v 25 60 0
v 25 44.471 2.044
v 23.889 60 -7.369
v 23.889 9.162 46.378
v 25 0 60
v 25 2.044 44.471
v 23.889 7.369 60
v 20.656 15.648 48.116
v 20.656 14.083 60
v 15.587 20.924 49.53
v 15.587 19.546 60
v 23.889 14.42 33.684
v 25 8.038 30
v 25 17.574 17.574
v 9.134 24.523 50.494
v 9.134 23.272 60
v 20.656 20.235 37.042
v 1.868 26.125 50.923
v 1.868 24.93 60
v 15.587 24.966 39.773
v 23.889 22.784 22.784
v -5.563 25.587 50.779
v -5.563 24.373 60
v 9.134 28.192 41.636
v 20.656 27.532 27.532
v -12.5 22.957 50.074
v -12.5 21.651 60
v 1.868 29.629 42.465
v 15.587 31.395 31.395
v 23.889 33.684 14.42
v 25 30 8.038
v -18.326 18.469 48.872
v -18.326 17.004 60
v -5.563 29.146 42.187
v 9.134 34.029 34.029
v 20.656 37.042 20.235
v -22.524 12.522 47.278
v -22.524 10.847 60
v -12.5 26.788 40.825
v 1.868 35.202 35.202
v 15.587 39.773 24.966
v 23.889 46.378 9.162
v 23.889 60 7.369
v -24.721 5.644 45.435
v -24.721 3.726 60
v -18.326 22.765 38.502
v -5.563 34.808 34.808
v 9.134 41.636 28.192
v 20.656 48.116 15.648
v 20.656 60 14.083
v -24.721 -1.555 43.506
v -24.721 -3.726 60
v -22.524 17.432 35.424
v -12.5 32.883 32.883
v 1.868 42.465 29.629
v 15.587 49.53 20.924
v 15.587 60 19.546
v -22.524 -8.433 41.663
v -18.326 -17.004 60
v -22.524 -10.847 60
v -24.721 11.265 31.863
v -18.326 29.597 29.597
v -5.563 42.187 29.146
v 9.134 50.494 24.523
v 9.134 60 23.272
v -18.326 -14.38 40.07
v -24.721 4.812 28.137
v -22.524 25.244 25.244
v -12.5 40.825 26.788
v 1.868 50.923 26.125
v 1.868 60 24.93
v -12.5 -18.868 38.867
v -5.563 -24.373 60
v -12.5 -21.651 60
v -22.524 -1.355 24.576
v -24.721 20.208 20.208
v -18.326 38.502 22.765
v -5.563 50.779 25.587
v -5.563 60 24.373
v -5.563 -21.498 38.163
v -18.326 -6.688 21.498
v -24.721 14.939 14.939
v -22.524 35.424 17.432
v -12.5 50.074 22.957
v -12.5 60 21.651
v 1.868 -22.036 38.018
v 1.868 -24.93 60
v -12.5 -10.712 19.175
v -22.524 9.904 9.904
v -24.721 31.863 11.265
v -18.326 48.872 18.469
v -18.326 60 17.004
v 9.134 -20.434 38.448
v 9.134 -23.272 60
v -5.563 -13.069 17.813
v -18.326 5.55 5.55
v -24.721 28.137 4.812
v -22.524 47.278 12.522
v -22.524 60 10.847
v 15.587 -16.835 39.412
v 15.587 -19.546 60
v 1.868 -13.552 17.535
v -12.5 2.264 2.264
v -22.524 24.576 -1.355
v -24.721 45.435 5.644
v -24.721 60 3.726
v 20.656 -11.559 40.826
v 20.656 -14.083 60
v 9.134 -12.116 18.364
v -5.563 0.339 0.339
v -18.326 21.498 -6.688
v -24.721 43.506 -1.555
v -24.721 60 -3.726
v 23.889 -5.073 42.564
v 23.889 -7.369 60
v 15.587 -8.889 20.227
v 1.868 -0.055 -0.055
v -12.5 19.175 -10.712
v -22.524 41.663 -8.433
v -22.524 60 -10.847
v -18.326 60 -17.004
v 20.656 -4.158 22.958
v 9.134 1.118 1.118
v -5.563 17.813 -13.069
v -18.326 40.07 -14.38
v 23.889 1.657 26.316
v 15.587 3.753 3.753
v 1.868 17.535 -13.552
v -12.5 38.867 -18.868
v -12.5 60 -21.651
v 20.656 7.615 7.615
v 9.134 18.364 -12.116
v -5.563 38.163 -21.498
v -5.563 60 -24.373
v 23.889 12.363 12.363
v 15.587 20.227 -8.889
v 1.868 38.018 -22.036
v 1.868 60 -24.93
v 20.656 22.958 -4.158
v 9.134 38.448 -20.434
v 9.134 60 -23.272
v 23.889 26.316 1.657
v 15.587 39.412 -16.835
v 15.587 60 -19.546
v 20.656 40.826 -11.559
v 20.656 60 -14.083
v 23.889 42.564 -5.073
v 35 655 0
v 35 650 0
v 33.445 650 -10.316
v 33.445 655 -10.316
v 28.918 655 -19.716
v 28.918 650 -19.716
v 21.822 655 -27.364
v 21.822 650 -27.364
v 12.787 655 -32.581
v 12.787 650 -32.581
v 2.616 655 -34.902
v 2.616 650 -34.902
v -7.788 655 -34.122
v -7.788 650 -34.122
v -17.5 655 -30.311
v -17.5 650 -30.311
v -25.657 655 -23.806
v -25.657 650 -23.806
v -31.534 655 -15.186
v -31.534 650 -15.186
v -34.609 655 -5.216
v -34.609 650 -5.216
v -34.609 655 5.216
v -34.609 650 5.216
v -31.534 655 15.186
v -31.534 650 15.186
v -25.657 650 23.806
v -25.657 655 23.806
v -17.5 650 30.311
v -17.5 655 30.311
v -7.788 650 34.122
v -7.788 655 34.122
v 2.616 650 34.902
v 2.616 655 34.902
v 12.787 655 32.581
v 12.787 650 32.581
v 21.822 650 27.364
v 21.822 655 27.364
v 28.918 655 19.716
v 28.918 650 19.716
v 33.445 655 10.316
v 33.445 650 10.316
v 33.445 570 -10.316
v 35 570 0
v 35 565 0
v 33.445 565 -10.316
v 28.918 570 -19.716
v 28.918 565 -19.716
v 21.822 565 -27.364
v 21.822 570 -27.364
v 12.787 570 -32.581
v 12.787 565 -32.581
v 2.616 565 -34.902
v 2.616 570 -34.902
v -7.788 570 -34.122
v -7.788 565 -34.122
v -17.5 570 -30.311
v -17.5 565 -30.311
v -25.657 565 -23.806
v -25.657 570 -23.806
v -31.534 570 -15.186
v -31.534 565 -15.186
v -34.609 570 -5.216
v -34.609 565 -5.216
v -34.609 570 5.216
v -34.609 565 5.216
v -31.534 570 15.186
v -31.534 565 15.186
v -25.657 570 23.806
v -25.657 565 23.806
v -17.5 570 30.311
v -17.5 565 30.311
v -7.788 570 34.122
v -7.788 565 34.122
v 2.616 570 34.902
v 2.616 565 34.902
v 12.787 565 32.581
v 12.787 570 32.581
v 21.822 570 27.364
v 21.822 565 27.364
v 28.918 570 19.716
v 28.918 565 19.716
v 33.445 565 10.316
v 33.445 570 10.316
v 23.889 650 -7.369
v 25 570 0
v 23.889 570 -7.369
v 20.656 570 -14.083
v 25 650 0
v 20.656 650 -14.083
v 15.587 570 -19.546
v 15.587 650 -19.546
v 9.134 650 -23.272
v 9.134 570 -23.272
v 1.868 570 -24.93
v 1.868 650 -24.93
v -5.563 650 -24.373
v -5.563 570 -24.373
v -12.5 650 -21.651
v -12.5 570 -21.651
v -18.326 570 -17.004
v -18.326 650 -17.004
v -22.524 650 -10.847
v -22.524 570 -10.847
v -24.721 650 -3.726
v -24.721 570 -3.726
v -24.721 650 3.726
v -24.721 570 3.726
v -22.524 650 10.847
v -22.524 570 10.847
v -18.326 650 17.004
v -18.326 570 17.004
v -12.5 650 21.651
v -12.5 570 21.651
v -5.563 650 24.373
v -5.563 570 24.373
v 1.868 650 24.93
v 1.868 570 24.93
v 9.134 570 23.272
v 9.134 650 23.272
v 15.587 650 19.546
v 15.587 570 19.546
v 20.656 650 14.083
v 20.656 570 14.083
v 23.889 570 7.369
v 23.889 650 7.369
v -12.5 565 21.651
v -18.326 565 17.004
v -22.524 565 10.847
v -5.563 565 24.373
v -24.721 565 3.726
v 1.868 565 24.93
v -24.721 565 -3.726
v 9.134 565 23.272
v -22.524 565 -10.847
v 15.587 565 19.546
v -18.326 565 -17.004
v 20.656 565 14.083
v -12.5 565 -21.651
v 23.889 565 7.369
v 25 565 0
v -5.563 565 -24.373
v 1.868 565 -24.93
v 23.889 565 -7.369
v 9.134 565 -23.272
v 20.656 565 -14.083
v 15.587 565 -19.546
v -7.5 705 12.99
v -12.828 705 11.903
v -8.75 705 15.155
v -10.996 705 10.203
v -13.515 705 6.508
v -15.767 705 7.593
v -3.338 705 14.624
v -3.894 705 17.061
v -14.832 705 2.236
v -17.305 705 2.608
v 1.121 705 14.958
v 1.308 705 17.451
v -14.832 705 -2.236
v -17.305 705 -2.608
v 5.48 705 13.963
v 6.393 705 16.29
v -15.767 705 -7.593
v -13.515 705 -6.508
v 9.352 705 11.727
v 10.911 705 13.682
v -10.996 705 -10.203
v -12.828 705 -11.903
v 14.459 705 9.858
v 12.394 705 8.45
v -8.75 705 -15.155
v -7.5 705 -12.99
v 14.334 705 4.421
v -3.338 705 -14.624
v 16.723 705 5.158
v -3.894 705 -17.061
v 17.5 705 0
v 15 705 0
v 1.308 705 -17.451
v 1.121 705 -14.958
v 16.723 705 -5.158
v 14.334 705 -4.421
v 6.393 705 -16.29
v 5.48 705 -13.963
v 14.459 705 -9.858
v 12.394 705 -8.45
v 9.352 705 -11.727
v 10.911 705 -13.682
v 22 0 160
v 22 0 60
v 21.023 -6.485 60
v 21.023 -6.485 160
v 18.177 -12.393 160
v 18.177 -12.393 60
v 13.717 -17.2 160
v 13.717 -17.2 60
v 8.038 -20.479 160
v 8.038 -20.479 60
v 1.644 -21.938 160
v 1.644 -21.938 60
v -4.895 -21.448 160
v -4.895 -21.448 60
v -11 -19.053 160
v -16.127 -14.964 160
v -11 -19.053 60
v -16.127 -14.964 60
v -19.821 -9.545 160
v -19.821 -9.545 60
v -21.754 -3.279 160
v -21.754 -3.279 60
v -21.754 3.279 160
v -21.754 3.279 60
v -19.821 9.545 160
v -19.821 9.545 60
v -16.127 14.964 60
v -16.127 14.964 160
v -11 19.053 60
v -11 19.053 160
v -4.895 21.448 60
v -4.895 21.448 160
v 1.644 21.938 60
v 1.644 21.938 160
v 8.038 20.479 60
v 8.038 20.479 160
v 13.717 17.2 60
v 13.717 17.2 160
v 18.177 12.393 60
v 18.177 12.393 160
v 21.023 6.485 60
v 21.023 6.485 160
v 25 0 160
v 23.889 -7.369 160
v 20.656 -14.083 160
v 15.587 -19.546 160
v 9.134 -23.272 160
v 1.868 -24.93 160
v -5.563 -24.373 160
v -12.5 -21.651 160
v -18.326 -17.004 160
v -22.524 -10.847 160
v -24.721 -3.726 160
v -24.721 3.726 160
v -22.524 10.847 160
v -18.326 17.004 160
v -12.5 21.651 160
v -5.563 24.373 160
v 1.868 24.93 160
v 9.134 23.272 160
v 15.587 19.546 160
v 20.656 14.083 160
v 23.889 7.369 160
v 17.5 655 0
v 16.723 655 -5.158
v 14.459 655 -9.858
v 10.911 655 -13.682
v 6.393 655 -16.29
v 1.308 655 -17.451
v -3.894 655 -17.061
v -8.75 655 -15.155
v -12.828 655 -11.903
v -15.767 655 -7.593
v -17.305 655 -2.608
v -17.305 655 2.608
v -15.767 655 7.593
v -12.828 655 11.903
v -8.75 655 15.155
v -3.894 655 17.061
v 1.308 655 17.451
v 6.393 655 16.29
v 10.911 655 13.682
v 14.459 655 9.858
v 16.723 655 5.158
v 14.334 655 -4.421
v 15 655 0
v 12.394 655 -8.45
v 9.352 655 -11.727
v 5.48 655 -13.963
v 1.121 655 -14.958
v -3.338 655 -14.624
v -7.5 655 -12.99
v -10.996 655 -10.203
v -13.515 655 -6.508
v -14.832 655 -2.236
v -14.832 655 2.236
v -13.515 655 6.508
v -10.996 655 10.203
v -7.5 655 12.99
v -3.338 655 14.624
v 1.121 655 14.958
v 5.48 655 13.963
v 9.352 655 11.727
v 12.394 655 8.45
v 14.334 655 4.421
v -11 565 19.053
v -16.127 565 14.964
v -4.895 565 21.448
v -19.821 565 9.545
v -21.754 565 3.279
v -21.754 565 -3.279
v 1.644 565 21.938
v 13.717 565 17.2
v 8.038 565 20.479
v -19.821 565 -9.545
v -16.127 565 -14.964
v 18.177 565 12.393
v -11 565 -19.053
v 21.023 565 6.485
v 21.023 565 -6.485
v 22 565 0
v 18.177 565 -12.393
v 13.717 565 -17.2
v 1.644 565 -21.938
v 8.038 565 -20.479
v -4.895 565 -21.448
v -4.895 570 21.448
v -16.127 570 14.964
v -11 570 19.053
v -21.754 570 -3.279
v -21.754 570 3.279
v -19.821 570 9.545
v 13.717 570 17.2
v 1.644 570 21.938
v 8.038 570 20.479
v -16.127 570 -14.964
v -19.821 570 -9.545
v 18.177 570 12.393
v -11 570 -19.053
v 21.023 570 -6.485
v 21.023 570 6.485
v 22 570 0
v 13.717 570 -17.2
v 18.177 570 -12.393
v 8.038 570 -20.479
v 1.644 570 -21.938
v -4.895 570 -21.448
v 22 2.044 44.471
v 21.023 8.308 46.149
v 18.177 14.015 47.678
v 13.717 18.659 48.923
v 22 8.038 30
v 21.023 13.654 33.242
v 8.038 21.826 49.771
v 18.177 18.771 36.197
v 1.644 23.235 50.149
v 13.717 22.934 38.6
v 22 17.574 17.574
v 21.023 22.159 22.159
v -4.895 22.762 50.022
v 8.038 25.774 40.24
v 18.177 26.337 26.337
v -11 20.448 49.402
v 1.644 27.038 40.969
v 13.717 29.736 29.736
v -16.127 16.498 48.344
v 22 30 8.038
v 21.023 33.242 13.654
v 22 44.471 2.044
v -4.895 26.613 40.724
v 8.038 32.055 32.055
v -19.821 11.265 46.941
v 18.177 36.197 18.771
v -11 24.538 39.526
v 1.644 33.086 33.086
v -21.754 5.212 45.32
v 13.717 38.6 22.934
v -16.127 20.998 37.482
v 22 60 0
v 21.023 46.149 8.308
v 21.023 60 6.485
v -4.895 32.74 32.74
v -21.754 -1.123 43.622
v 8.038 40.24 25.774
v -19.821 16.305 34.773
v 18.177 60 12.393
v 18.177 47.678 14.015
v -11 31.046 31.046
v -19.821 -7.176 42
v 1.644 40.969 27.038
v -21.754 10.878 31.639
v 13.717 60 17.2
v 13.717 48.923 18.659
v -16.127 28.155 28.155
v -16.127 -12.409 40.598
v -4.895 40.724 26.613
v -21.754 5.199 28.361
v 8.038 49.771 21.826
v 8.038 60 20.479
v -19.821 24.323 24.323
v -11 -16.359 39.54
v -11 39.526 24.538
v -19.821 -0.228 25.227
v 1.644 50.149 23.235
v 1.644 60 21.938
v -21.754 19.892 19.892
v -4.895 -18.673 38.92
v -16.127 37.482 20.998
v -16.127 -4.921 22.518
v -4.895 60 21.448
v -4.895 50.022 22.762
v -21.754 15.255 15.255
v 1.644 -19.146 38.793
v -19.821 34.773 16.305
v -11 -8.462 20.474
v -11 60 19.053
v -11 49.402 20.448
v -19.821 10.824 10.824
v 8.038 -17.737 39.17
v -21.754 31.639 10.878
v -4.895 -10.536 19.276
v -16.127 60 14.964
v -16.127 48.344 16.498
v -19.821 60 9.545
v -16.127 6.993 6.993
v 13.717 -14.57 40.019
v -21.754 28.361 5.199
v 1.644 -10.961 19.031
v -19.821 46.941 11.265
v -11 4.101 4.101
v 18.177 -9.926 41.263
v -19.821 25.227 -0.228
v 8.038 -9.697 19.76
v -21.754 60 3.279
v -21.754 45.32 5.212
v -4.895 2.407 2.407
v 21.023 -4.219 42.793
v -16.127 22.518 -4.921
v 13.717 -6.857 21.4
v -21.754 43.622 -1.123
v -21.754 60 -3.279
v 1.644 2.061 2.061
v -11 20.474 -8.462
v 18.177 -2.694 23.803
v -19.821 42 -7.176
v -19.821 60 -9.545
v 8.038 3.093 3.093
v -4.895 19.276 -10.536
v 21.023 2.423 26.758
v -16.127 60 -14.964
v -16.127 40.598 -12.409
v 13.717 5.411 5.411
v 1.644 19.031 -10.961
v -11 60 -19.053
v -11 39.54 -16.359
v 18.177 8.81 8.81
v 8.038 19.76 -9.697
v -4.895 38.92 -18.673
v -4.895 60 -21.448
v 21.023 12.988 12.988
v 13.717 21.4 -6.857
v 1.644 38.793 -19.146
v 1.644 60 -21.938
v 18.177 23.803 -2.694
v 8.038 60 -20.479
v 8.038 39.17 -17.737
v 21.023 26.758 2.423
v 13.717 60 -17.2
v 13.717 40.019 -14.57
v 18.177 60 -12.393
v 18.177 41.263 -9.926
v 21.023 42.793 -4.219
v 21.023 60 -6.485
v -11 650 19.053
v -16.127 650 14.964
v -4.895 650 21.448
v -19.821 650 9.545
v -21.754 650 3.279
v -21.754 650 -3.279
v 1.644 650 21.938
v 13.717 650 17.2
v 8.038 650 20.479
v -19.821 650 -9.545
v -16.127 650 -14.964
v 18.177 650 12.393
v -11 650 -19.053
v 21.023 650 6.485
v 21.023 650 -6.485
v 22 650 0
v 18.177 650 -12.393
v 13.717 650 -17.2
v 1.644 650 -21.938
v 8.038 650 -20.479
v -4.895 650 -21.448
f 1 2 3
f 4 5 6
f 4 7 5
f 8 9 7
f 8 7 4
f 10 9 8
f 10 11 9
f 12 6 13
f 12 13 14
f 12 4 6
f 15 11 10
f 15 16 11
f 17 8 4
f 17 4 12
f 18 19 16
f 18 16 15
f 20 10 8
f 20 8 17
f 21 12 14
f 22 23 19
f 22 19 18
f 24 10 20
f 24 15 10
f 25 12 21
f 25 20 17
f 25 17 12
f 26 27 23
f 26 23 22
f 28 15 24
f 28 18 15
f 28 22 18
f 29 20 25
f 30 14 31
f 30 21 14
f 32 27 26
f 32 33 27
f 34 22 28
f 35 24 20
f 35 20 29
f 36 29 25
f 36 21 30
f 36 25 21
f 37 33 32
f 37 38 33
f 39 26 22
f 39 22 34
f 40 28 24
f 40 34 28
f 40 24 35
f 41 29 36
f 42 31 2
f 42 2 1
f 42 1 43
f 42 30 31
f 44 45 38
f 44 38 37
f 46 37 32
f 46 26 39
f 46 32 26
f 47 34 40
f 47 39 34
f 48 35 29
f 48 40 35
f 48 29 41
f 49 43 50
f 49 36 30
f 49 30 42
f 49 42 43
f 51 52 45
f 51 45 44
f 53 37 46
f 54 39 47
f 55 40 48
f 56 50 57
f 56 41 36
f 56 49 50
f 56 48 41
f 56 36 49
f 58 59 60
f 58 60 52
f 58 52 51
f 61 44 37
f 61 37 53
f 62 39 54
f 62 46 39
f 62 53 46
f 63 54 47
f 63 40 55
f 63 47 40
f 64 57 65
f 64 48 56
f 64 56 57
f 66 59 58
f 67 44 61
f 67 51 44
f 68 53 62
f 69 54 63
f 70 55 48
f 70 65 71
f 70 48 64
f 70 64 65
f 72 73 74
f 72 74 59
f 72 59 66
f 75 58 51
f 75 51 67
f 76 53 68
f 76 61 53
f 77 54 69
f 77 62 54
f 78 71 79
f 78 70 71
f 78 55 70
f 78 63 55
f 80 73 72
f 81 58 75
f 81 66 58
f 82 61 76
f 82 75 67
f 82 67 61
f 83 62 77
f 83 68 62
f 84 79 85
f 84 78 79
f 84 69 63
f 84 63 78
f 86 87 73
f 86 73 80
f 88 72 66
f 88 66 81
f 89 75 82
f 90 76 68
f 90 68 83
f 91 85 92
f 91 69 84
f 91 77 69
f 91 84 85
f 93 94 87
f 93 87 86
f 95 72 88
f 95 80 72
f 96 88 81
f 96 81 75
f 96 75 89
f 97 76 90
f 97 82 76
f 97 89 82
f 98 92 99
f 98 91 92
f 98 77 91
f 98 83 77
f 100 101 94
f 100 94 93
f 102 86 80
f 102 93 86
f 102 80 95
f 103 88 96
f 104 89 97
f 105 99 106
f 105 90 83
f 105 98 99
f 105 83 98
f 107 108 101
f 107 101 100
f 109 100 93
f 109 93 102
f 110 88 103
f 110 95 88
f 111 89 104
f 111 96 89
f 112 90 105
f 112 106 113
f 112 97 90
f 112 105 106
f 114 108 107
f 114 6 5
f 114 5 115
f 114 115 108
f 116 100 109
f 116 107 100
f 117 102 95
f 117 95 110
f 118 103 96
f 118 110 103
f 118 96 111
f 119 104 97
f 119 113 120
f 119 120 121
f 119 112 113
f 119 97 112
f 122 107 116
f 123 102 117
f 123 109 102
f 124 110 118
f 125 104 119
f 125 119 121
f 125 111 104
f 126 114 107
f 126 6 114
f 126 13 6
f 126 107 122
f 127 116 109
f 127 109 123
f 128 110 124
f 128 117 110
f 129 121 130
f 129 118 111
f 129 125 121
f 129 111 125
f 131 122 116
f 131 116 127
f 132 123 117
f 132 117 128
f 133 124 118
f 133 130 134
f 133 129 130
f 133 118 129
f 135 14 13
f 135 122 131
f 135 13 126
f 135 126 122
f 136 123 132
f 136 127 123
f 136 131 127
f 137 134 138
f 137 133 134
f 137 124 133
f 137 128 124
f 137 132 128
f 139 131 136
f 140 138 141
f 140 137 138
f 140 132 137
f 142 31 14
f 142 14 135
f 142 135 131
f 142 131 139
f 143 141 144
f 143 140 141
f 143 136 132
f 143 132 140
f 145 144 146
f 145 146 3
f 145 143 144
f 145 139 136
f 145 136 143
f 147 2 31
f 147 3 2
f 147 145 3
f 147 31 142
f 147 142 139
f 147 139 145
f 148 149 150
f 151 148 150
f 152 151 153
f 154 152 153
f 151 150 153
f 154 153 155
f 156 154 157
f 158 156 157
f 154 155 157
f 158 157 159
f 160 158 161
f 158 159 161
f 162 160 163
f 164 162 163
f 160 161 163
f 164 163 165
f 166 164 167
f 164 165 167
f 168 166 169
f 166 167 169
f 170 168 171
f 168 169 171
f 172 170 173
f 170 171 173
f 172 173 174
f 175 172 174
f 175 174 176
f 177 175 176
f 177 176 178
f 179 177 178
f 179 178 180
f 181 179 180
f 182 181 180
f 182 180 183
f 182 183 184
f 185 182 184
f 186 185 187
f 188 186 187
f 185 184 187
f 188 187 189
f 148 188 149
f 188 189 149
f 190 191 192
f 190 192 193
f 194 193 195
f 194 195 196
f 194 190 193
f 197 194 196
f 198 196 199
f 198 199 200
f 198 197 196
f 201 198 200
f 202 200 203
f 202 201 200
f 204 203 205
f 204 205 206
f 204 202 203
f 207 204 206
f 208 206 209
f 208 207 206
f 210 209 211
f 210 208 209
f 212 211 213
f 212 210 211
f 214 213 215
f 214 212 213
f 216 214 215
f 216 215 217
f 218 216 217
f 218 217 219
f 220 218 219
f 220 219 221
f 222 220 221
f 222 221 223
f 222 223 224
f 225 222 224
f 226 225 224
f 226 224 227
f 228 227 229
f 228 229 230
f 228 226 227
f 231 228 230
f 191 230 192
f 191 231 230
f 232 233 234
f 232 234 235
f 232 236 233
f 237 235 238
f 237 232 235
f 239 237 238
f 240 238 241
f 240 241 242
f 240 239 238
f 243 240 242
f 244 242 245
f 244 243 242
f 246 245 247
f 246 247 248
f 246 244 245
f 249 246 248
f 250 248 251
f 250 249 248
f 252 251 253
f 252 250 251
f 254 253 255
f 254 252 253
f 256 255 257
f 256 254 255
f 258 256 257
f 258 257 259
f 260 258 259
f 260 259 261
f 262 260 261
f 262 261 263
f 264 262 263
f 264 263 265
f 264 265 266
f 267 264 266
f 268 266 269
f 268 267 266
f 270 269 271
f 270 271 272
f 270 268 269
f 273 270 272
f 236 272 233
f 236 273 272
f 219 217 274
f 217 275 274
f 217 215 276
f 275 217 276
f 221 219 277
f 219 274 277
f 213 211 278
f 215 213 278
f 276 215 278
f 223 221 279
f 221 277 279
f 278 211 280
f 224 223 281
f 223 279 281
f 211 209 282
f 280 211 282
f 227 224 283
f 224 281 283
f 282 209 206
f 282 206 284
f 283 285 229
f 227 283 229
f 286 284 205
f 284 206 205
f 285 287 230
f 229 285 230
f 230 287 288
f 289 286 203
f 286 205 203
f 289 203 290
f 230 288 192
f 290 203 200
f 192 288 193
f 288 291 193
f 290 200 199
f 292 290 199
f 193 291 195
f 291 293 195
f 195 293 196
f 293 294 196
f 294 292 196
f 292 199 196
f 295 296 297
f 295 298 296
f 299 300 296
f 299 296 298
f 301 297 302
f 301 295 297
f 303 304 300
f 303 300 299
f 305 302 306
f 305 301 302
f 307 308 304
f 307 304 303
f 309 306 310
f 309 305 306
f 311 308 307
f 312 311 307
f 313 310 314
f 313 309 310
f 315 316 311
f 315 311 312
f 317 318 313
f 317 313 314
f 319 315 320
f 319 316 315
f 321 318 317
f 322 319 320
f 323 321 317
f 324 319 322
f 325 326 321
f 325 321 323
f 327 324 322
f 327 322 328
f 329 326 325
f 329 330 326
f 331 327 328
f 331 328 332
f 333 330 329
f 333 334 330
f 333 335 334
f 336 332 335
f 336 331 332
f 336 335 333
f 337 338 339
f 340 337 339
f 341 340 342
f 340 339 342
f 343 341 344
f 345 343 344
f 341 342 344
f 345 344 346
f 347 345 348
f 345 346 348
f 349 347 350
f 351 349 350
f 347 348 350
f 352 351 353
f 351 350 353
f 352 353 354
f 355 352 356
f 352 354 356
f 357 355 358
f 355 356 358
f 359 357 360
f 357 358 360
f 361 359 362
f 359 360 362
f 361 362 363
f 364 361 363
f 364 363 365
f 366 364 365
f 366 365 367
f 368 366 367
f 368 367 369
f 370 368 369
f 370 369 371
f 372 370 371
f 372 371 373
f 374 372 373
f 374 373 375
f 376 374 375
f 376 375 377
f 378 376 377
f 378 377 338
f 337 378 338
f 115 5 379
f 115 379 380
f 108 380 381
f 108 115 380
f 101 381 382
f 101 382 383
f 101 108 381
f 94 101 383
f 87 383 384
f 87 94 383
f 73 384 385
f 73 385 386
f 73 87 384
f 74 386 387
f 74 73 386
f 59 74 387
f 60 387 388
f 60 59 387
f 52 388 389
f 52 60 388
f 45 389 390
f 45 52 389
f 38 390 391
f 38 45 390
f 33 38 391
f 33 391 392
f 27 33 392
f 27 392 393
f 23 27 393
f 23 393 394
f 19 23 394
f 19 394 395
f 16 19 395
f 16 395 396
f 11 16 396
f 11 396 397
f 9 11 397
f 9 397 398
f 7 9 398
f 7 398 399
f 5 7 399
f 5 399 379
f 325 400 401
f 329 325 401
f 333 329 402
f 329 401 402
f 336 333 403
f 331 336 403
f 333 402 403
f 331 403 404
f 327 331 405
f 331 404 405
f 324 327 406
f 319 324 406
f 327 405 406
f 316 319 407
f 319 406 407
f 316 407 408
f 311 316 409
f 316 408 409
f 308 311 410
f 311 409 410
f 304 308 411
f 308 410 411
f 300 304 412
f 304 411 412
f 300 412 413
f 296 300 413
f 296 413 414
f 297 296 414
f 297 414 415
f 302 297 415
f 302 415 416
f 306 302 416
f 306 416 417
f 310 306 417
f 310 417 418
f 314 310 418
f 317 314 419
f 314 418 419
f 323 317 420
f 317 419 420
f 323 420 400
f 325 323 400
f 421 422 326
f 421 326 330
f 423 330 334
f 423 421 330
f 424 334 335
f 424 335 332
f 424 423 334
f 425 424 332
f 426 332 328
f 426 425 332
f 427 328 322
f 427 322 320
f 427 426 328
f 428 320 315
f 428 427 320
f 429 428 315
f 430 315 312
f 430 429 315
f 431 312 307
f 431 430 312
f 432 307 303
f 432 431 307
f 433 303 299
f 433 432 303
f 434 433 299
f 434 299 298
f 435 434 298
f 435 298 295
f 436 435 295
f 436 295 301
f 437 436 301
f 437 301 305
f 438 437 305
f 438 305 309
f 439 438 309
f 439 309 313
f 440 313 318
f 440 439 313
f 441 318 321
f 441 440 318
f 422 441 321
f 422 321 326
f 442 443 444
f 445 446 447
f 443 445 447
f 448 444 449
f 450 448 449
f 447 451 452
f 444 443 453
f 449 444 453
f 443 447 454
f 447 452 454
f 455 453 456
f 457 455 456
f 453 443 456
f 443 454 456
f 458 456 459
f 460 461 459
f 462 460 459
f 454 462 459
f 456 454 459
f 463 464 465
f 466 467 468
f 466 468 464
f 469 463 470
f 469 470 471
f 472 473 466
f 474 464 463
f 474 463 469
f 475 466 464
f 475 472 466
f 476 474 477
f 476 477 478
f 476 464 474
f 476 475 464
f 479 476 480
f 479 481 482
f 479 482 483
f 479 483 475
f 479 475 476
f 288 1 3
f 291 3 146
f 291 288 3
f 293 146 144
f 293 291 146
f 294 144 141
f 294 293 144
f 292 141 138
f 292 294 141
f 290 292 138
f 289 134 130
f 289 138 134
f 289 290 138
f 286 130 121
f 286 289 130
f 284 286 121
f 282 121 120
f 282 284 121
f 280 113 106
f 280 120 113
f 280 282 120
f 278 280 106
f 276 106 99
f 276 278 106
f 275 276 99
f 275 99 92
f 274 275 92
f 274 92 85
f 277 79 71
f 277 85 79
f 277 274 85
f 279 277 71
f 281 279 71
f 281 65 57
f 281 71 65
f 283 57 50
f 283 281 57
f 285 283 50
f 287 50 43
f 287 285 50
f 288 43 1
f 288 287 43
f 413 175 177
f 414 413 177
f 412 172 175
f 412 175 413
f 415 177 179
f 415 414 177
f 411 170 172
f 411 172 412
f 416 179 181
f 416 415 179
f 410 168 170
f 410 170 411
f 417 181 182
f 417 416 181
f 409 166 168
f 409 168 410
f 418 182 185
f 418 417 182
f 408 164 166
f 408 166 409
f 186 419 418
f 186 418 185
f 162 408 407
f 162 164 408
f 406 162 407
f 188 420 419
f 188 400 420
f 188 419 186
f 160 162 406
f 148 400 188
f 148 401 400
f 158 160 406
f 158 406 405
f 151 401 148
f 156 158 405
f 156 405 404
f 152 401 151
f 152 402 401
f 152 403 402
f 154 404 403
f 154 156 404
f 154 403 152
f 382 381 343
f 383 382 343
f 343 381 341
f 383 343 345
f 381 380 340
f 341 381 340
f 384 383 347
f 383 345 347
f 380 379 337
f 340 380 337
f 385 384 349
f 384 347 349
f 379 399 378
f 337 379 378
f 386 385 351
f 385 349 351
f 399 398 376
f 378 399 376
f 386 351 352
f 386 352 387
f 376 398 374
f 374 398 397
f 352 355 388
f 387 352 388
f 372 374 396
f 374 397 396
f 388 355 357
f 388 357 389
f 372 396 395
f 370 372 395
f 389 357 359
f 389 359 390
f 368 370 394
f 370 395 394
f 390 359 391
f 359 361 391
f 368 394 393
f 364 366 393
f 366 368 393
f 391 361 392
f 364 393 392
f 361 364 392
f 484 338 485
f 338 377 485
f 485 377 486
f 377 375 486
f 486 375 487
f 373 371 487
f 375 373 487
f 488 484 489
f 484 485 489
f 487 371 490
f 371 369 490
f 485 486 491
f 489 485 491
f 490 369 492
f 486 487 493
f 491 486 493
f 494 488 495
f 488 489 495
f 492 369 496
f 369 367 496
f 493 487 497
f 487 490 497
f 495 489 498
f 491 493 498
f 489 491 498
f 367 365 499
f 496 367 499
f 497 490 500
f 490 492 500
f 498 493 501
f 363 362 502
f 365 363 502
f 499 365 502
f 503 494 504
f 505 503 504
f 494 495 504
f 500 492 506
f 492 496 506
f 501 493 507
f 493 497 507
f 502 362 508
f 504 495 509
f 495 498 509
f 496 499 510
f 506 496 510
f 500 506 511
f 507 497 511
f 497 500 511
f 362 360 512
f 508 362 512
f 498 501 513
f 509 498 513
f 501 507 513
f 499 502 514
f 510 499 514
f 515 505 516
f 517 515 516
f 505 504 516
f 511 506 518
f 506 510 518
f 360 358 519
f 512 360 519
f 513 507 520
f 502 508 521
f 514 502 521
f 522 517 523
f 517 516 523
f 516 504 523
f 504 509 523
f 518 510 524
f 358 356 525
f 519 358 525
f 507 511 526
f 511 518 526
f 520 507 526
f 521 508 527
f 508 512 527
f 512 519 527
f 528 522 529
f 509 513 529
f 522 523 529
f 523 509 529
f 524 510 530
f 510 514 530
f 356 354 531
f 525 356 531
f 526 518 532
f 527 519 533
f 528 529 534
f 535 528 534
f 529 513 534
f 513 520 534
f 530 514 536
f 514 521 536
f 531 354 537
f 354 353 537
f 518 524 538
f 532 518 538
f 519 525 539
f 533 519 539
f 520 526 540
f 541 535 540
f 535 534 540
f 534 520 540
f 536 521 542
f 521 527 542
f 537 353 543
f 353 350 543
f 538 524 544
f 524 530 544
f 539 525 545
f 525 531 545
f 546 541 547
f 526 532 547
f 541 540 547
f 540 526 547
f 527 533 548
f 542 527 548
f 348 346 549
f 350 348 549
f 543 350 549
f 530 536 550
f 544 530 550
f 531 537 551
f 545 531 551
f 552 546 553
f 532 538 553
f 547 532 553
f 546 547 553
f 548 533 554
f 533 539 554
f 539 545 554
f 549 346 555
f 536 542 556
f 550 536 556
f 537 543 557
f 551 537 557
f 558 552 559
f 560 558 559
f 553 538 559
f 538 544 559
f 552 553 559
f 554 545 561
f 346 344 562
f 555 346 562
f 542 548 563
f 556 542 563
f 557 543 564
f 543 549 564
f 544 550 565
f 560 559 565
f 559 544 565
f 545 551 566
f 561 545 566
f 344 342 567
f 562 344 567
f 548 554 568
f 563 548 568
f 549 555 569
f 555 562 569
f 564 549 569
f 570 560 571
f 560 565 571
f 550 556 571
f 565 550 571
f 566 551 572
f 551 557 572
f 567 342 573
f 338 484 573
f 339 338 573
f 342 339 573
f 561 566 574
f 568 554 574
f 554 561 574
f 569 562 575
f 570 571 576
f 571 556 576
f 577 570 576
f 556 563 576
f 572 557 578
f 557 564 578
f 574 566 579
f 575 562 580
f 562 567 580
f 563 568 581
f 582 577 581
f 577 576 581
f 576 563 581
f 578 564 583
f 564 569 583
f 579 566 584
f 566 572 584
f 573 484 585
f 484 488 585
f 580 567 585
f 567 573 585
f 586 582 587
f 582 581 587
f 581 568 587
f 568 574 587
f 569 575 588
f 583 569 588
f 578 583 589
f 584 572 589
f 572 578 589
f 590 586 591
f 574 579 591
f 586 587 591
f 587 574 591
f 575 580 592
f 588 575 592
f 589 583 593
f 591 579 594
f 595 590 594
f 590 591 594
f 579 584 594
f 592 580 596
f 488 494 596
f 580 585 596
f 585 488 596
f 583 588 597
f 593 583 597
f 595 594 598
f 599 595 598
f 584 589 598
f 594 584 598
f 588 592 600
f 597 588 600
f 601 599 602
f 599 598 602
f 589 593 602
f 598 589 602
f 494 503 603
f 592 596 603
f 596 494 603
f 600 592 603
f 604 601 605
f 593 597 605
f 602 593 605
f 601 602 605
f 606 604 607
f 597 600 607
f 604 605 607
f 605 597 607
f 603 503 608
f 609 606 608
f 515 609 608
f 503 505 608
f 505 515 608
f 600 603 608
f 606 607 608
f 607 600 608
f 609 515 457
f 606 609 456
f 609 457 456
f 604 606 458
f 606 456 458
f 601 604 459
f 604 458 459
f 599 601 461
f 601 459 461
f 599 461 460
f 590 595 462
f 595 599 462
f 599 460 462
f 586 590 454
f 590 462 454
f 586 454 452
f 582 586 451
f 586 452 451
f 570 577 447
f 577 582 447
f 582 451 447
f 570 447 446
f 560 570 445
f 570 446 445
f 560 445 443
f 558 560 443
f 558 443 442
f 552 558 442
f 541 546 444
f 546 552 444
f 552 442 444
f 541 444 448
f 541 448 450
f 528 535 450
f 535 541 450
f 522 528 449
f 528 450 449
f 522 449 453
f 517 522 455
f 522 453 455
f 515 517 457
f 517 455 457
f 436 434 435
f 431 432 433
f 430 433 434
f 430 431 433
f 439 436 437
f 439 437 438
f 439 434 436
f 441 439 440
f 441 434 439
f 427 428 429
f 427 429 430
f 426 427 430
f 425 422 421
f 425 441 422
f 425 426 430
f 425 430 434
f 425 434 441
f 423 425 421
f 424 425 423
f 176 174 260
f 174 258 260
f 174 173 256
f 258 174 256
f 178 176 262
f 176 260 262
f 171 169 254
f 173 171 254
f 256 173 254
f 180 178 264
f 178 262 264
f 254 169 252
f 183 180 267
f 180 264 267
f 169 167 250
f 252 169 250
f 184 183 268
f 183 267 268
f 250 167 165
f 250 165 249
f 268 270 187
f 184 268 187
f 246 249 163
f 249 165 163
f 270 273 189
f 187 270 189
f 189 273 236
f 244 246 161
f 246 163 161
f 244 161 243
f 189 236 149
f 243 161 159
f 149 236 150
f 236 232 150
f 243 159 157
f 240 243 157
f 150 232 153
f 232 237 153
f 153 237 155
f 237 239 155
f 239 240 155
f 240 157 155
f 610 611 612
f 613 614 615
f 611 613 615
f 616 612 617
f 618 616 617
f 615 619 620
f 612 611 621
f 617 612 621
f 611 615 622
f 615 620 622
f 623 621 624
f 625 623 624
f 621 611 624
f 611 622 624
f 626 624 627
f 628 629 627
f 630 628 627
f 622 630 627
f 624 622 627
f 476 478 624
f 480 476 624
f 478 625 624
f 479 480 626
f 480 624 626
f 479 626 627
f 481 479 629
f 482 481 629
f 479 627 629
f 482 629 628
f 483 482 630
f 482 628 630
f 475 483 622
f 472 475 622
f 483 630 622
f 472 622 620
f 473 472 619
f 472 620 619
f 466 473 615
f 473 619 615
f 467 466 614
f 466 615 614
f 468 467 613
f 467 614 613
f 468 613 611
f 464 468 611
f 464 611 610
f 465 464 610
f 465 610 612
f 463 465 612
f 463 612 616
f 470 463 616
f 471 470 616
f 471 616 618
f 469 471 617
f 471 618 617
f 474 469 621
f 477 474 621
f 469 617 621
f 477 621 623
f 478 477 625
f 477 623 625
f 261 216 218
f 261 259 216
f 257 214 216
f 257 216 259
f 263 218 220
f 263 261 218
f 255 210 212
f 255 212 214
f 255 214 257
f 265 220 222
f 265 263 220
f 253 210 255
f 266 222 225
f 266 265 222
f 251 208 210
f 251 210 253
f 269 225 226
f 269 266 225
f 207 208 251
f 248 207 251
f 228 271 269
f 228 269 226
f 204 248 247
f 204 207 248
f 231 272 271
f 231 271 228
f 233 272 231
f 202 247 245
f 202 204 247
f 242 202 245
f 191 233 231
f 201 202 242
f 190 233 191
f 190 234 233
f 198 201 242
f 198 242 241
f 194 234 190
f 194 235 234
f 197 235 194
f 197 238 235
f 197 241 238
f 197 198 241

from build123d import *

# Parameters (mm, degrees)
SKETCH9_R           = 25
SKETCH9_R_2         = 22
SKETCH10_R          = 35
BOSS_EXTRUDE1_DEPTH = 5
SKETCH11_R          = 17.5
SKETCH11_R_2        = 15
EXTRUDE_THIN1_DEPTH = 50


with BuildPart() as part:
    # Sweep-Thin1: sweep along a path in Sketch2
    with BuildLine(Plane(origin=(0, 0, 0), x_dir=(0, 0, -1), z_dir=(1, 0, 0))) as sweep_thin1_path:
        Line((-160, 0), (-60, 0))
        ThreePointArc((-60, 0), (-17.573593129, 17.573593129), (0, 60))
        Line((0, 60), (0, 650))
    # Sketch9 → Sweep-Thin1 (sweep)
    with BuildSketch(Plane(origin=(0, 650, 0), x_dir=(1, 0, 0), z_dir=(0, 1, 0))):
        Circle(SKETCH9_R)
        Circle(SKETCH9_R_2, mode=Mode.SUBTRACT)
    sweep(path=sweep_thin1_path.line)

    # Sketch10 → Boss-Extrude1 (add)
    with BuildSketch(Plane(origin=(0, 650, 0), x_dir=(1, 0, 0), z_dir=(0, 1, 0))):
        Circle(SKETCH10_R)
    boss_extrude1 = extrude(amount=BOSS_EXTRUDE1_DEPTH)

    # Sketch11 → Extrude-Thin1 (add)
    with BuildSketch(Plane(origin=(0, 655, 0), x_dir=(1, 0, 0), z_dir=(0, 1, 0))):
        Circle(SKETCH11_R)
        Circle(SKETCH11_R_2, mode=Mode.SUBTRACT)
    extrude(amount=EXTRUDE_THIN1_DEPTH)

    # Mirror1: Boss-Extrude1 across plane
    add(boss_extrude1.mirror(Plane.ZX.offset(610)))


solid = part.part
